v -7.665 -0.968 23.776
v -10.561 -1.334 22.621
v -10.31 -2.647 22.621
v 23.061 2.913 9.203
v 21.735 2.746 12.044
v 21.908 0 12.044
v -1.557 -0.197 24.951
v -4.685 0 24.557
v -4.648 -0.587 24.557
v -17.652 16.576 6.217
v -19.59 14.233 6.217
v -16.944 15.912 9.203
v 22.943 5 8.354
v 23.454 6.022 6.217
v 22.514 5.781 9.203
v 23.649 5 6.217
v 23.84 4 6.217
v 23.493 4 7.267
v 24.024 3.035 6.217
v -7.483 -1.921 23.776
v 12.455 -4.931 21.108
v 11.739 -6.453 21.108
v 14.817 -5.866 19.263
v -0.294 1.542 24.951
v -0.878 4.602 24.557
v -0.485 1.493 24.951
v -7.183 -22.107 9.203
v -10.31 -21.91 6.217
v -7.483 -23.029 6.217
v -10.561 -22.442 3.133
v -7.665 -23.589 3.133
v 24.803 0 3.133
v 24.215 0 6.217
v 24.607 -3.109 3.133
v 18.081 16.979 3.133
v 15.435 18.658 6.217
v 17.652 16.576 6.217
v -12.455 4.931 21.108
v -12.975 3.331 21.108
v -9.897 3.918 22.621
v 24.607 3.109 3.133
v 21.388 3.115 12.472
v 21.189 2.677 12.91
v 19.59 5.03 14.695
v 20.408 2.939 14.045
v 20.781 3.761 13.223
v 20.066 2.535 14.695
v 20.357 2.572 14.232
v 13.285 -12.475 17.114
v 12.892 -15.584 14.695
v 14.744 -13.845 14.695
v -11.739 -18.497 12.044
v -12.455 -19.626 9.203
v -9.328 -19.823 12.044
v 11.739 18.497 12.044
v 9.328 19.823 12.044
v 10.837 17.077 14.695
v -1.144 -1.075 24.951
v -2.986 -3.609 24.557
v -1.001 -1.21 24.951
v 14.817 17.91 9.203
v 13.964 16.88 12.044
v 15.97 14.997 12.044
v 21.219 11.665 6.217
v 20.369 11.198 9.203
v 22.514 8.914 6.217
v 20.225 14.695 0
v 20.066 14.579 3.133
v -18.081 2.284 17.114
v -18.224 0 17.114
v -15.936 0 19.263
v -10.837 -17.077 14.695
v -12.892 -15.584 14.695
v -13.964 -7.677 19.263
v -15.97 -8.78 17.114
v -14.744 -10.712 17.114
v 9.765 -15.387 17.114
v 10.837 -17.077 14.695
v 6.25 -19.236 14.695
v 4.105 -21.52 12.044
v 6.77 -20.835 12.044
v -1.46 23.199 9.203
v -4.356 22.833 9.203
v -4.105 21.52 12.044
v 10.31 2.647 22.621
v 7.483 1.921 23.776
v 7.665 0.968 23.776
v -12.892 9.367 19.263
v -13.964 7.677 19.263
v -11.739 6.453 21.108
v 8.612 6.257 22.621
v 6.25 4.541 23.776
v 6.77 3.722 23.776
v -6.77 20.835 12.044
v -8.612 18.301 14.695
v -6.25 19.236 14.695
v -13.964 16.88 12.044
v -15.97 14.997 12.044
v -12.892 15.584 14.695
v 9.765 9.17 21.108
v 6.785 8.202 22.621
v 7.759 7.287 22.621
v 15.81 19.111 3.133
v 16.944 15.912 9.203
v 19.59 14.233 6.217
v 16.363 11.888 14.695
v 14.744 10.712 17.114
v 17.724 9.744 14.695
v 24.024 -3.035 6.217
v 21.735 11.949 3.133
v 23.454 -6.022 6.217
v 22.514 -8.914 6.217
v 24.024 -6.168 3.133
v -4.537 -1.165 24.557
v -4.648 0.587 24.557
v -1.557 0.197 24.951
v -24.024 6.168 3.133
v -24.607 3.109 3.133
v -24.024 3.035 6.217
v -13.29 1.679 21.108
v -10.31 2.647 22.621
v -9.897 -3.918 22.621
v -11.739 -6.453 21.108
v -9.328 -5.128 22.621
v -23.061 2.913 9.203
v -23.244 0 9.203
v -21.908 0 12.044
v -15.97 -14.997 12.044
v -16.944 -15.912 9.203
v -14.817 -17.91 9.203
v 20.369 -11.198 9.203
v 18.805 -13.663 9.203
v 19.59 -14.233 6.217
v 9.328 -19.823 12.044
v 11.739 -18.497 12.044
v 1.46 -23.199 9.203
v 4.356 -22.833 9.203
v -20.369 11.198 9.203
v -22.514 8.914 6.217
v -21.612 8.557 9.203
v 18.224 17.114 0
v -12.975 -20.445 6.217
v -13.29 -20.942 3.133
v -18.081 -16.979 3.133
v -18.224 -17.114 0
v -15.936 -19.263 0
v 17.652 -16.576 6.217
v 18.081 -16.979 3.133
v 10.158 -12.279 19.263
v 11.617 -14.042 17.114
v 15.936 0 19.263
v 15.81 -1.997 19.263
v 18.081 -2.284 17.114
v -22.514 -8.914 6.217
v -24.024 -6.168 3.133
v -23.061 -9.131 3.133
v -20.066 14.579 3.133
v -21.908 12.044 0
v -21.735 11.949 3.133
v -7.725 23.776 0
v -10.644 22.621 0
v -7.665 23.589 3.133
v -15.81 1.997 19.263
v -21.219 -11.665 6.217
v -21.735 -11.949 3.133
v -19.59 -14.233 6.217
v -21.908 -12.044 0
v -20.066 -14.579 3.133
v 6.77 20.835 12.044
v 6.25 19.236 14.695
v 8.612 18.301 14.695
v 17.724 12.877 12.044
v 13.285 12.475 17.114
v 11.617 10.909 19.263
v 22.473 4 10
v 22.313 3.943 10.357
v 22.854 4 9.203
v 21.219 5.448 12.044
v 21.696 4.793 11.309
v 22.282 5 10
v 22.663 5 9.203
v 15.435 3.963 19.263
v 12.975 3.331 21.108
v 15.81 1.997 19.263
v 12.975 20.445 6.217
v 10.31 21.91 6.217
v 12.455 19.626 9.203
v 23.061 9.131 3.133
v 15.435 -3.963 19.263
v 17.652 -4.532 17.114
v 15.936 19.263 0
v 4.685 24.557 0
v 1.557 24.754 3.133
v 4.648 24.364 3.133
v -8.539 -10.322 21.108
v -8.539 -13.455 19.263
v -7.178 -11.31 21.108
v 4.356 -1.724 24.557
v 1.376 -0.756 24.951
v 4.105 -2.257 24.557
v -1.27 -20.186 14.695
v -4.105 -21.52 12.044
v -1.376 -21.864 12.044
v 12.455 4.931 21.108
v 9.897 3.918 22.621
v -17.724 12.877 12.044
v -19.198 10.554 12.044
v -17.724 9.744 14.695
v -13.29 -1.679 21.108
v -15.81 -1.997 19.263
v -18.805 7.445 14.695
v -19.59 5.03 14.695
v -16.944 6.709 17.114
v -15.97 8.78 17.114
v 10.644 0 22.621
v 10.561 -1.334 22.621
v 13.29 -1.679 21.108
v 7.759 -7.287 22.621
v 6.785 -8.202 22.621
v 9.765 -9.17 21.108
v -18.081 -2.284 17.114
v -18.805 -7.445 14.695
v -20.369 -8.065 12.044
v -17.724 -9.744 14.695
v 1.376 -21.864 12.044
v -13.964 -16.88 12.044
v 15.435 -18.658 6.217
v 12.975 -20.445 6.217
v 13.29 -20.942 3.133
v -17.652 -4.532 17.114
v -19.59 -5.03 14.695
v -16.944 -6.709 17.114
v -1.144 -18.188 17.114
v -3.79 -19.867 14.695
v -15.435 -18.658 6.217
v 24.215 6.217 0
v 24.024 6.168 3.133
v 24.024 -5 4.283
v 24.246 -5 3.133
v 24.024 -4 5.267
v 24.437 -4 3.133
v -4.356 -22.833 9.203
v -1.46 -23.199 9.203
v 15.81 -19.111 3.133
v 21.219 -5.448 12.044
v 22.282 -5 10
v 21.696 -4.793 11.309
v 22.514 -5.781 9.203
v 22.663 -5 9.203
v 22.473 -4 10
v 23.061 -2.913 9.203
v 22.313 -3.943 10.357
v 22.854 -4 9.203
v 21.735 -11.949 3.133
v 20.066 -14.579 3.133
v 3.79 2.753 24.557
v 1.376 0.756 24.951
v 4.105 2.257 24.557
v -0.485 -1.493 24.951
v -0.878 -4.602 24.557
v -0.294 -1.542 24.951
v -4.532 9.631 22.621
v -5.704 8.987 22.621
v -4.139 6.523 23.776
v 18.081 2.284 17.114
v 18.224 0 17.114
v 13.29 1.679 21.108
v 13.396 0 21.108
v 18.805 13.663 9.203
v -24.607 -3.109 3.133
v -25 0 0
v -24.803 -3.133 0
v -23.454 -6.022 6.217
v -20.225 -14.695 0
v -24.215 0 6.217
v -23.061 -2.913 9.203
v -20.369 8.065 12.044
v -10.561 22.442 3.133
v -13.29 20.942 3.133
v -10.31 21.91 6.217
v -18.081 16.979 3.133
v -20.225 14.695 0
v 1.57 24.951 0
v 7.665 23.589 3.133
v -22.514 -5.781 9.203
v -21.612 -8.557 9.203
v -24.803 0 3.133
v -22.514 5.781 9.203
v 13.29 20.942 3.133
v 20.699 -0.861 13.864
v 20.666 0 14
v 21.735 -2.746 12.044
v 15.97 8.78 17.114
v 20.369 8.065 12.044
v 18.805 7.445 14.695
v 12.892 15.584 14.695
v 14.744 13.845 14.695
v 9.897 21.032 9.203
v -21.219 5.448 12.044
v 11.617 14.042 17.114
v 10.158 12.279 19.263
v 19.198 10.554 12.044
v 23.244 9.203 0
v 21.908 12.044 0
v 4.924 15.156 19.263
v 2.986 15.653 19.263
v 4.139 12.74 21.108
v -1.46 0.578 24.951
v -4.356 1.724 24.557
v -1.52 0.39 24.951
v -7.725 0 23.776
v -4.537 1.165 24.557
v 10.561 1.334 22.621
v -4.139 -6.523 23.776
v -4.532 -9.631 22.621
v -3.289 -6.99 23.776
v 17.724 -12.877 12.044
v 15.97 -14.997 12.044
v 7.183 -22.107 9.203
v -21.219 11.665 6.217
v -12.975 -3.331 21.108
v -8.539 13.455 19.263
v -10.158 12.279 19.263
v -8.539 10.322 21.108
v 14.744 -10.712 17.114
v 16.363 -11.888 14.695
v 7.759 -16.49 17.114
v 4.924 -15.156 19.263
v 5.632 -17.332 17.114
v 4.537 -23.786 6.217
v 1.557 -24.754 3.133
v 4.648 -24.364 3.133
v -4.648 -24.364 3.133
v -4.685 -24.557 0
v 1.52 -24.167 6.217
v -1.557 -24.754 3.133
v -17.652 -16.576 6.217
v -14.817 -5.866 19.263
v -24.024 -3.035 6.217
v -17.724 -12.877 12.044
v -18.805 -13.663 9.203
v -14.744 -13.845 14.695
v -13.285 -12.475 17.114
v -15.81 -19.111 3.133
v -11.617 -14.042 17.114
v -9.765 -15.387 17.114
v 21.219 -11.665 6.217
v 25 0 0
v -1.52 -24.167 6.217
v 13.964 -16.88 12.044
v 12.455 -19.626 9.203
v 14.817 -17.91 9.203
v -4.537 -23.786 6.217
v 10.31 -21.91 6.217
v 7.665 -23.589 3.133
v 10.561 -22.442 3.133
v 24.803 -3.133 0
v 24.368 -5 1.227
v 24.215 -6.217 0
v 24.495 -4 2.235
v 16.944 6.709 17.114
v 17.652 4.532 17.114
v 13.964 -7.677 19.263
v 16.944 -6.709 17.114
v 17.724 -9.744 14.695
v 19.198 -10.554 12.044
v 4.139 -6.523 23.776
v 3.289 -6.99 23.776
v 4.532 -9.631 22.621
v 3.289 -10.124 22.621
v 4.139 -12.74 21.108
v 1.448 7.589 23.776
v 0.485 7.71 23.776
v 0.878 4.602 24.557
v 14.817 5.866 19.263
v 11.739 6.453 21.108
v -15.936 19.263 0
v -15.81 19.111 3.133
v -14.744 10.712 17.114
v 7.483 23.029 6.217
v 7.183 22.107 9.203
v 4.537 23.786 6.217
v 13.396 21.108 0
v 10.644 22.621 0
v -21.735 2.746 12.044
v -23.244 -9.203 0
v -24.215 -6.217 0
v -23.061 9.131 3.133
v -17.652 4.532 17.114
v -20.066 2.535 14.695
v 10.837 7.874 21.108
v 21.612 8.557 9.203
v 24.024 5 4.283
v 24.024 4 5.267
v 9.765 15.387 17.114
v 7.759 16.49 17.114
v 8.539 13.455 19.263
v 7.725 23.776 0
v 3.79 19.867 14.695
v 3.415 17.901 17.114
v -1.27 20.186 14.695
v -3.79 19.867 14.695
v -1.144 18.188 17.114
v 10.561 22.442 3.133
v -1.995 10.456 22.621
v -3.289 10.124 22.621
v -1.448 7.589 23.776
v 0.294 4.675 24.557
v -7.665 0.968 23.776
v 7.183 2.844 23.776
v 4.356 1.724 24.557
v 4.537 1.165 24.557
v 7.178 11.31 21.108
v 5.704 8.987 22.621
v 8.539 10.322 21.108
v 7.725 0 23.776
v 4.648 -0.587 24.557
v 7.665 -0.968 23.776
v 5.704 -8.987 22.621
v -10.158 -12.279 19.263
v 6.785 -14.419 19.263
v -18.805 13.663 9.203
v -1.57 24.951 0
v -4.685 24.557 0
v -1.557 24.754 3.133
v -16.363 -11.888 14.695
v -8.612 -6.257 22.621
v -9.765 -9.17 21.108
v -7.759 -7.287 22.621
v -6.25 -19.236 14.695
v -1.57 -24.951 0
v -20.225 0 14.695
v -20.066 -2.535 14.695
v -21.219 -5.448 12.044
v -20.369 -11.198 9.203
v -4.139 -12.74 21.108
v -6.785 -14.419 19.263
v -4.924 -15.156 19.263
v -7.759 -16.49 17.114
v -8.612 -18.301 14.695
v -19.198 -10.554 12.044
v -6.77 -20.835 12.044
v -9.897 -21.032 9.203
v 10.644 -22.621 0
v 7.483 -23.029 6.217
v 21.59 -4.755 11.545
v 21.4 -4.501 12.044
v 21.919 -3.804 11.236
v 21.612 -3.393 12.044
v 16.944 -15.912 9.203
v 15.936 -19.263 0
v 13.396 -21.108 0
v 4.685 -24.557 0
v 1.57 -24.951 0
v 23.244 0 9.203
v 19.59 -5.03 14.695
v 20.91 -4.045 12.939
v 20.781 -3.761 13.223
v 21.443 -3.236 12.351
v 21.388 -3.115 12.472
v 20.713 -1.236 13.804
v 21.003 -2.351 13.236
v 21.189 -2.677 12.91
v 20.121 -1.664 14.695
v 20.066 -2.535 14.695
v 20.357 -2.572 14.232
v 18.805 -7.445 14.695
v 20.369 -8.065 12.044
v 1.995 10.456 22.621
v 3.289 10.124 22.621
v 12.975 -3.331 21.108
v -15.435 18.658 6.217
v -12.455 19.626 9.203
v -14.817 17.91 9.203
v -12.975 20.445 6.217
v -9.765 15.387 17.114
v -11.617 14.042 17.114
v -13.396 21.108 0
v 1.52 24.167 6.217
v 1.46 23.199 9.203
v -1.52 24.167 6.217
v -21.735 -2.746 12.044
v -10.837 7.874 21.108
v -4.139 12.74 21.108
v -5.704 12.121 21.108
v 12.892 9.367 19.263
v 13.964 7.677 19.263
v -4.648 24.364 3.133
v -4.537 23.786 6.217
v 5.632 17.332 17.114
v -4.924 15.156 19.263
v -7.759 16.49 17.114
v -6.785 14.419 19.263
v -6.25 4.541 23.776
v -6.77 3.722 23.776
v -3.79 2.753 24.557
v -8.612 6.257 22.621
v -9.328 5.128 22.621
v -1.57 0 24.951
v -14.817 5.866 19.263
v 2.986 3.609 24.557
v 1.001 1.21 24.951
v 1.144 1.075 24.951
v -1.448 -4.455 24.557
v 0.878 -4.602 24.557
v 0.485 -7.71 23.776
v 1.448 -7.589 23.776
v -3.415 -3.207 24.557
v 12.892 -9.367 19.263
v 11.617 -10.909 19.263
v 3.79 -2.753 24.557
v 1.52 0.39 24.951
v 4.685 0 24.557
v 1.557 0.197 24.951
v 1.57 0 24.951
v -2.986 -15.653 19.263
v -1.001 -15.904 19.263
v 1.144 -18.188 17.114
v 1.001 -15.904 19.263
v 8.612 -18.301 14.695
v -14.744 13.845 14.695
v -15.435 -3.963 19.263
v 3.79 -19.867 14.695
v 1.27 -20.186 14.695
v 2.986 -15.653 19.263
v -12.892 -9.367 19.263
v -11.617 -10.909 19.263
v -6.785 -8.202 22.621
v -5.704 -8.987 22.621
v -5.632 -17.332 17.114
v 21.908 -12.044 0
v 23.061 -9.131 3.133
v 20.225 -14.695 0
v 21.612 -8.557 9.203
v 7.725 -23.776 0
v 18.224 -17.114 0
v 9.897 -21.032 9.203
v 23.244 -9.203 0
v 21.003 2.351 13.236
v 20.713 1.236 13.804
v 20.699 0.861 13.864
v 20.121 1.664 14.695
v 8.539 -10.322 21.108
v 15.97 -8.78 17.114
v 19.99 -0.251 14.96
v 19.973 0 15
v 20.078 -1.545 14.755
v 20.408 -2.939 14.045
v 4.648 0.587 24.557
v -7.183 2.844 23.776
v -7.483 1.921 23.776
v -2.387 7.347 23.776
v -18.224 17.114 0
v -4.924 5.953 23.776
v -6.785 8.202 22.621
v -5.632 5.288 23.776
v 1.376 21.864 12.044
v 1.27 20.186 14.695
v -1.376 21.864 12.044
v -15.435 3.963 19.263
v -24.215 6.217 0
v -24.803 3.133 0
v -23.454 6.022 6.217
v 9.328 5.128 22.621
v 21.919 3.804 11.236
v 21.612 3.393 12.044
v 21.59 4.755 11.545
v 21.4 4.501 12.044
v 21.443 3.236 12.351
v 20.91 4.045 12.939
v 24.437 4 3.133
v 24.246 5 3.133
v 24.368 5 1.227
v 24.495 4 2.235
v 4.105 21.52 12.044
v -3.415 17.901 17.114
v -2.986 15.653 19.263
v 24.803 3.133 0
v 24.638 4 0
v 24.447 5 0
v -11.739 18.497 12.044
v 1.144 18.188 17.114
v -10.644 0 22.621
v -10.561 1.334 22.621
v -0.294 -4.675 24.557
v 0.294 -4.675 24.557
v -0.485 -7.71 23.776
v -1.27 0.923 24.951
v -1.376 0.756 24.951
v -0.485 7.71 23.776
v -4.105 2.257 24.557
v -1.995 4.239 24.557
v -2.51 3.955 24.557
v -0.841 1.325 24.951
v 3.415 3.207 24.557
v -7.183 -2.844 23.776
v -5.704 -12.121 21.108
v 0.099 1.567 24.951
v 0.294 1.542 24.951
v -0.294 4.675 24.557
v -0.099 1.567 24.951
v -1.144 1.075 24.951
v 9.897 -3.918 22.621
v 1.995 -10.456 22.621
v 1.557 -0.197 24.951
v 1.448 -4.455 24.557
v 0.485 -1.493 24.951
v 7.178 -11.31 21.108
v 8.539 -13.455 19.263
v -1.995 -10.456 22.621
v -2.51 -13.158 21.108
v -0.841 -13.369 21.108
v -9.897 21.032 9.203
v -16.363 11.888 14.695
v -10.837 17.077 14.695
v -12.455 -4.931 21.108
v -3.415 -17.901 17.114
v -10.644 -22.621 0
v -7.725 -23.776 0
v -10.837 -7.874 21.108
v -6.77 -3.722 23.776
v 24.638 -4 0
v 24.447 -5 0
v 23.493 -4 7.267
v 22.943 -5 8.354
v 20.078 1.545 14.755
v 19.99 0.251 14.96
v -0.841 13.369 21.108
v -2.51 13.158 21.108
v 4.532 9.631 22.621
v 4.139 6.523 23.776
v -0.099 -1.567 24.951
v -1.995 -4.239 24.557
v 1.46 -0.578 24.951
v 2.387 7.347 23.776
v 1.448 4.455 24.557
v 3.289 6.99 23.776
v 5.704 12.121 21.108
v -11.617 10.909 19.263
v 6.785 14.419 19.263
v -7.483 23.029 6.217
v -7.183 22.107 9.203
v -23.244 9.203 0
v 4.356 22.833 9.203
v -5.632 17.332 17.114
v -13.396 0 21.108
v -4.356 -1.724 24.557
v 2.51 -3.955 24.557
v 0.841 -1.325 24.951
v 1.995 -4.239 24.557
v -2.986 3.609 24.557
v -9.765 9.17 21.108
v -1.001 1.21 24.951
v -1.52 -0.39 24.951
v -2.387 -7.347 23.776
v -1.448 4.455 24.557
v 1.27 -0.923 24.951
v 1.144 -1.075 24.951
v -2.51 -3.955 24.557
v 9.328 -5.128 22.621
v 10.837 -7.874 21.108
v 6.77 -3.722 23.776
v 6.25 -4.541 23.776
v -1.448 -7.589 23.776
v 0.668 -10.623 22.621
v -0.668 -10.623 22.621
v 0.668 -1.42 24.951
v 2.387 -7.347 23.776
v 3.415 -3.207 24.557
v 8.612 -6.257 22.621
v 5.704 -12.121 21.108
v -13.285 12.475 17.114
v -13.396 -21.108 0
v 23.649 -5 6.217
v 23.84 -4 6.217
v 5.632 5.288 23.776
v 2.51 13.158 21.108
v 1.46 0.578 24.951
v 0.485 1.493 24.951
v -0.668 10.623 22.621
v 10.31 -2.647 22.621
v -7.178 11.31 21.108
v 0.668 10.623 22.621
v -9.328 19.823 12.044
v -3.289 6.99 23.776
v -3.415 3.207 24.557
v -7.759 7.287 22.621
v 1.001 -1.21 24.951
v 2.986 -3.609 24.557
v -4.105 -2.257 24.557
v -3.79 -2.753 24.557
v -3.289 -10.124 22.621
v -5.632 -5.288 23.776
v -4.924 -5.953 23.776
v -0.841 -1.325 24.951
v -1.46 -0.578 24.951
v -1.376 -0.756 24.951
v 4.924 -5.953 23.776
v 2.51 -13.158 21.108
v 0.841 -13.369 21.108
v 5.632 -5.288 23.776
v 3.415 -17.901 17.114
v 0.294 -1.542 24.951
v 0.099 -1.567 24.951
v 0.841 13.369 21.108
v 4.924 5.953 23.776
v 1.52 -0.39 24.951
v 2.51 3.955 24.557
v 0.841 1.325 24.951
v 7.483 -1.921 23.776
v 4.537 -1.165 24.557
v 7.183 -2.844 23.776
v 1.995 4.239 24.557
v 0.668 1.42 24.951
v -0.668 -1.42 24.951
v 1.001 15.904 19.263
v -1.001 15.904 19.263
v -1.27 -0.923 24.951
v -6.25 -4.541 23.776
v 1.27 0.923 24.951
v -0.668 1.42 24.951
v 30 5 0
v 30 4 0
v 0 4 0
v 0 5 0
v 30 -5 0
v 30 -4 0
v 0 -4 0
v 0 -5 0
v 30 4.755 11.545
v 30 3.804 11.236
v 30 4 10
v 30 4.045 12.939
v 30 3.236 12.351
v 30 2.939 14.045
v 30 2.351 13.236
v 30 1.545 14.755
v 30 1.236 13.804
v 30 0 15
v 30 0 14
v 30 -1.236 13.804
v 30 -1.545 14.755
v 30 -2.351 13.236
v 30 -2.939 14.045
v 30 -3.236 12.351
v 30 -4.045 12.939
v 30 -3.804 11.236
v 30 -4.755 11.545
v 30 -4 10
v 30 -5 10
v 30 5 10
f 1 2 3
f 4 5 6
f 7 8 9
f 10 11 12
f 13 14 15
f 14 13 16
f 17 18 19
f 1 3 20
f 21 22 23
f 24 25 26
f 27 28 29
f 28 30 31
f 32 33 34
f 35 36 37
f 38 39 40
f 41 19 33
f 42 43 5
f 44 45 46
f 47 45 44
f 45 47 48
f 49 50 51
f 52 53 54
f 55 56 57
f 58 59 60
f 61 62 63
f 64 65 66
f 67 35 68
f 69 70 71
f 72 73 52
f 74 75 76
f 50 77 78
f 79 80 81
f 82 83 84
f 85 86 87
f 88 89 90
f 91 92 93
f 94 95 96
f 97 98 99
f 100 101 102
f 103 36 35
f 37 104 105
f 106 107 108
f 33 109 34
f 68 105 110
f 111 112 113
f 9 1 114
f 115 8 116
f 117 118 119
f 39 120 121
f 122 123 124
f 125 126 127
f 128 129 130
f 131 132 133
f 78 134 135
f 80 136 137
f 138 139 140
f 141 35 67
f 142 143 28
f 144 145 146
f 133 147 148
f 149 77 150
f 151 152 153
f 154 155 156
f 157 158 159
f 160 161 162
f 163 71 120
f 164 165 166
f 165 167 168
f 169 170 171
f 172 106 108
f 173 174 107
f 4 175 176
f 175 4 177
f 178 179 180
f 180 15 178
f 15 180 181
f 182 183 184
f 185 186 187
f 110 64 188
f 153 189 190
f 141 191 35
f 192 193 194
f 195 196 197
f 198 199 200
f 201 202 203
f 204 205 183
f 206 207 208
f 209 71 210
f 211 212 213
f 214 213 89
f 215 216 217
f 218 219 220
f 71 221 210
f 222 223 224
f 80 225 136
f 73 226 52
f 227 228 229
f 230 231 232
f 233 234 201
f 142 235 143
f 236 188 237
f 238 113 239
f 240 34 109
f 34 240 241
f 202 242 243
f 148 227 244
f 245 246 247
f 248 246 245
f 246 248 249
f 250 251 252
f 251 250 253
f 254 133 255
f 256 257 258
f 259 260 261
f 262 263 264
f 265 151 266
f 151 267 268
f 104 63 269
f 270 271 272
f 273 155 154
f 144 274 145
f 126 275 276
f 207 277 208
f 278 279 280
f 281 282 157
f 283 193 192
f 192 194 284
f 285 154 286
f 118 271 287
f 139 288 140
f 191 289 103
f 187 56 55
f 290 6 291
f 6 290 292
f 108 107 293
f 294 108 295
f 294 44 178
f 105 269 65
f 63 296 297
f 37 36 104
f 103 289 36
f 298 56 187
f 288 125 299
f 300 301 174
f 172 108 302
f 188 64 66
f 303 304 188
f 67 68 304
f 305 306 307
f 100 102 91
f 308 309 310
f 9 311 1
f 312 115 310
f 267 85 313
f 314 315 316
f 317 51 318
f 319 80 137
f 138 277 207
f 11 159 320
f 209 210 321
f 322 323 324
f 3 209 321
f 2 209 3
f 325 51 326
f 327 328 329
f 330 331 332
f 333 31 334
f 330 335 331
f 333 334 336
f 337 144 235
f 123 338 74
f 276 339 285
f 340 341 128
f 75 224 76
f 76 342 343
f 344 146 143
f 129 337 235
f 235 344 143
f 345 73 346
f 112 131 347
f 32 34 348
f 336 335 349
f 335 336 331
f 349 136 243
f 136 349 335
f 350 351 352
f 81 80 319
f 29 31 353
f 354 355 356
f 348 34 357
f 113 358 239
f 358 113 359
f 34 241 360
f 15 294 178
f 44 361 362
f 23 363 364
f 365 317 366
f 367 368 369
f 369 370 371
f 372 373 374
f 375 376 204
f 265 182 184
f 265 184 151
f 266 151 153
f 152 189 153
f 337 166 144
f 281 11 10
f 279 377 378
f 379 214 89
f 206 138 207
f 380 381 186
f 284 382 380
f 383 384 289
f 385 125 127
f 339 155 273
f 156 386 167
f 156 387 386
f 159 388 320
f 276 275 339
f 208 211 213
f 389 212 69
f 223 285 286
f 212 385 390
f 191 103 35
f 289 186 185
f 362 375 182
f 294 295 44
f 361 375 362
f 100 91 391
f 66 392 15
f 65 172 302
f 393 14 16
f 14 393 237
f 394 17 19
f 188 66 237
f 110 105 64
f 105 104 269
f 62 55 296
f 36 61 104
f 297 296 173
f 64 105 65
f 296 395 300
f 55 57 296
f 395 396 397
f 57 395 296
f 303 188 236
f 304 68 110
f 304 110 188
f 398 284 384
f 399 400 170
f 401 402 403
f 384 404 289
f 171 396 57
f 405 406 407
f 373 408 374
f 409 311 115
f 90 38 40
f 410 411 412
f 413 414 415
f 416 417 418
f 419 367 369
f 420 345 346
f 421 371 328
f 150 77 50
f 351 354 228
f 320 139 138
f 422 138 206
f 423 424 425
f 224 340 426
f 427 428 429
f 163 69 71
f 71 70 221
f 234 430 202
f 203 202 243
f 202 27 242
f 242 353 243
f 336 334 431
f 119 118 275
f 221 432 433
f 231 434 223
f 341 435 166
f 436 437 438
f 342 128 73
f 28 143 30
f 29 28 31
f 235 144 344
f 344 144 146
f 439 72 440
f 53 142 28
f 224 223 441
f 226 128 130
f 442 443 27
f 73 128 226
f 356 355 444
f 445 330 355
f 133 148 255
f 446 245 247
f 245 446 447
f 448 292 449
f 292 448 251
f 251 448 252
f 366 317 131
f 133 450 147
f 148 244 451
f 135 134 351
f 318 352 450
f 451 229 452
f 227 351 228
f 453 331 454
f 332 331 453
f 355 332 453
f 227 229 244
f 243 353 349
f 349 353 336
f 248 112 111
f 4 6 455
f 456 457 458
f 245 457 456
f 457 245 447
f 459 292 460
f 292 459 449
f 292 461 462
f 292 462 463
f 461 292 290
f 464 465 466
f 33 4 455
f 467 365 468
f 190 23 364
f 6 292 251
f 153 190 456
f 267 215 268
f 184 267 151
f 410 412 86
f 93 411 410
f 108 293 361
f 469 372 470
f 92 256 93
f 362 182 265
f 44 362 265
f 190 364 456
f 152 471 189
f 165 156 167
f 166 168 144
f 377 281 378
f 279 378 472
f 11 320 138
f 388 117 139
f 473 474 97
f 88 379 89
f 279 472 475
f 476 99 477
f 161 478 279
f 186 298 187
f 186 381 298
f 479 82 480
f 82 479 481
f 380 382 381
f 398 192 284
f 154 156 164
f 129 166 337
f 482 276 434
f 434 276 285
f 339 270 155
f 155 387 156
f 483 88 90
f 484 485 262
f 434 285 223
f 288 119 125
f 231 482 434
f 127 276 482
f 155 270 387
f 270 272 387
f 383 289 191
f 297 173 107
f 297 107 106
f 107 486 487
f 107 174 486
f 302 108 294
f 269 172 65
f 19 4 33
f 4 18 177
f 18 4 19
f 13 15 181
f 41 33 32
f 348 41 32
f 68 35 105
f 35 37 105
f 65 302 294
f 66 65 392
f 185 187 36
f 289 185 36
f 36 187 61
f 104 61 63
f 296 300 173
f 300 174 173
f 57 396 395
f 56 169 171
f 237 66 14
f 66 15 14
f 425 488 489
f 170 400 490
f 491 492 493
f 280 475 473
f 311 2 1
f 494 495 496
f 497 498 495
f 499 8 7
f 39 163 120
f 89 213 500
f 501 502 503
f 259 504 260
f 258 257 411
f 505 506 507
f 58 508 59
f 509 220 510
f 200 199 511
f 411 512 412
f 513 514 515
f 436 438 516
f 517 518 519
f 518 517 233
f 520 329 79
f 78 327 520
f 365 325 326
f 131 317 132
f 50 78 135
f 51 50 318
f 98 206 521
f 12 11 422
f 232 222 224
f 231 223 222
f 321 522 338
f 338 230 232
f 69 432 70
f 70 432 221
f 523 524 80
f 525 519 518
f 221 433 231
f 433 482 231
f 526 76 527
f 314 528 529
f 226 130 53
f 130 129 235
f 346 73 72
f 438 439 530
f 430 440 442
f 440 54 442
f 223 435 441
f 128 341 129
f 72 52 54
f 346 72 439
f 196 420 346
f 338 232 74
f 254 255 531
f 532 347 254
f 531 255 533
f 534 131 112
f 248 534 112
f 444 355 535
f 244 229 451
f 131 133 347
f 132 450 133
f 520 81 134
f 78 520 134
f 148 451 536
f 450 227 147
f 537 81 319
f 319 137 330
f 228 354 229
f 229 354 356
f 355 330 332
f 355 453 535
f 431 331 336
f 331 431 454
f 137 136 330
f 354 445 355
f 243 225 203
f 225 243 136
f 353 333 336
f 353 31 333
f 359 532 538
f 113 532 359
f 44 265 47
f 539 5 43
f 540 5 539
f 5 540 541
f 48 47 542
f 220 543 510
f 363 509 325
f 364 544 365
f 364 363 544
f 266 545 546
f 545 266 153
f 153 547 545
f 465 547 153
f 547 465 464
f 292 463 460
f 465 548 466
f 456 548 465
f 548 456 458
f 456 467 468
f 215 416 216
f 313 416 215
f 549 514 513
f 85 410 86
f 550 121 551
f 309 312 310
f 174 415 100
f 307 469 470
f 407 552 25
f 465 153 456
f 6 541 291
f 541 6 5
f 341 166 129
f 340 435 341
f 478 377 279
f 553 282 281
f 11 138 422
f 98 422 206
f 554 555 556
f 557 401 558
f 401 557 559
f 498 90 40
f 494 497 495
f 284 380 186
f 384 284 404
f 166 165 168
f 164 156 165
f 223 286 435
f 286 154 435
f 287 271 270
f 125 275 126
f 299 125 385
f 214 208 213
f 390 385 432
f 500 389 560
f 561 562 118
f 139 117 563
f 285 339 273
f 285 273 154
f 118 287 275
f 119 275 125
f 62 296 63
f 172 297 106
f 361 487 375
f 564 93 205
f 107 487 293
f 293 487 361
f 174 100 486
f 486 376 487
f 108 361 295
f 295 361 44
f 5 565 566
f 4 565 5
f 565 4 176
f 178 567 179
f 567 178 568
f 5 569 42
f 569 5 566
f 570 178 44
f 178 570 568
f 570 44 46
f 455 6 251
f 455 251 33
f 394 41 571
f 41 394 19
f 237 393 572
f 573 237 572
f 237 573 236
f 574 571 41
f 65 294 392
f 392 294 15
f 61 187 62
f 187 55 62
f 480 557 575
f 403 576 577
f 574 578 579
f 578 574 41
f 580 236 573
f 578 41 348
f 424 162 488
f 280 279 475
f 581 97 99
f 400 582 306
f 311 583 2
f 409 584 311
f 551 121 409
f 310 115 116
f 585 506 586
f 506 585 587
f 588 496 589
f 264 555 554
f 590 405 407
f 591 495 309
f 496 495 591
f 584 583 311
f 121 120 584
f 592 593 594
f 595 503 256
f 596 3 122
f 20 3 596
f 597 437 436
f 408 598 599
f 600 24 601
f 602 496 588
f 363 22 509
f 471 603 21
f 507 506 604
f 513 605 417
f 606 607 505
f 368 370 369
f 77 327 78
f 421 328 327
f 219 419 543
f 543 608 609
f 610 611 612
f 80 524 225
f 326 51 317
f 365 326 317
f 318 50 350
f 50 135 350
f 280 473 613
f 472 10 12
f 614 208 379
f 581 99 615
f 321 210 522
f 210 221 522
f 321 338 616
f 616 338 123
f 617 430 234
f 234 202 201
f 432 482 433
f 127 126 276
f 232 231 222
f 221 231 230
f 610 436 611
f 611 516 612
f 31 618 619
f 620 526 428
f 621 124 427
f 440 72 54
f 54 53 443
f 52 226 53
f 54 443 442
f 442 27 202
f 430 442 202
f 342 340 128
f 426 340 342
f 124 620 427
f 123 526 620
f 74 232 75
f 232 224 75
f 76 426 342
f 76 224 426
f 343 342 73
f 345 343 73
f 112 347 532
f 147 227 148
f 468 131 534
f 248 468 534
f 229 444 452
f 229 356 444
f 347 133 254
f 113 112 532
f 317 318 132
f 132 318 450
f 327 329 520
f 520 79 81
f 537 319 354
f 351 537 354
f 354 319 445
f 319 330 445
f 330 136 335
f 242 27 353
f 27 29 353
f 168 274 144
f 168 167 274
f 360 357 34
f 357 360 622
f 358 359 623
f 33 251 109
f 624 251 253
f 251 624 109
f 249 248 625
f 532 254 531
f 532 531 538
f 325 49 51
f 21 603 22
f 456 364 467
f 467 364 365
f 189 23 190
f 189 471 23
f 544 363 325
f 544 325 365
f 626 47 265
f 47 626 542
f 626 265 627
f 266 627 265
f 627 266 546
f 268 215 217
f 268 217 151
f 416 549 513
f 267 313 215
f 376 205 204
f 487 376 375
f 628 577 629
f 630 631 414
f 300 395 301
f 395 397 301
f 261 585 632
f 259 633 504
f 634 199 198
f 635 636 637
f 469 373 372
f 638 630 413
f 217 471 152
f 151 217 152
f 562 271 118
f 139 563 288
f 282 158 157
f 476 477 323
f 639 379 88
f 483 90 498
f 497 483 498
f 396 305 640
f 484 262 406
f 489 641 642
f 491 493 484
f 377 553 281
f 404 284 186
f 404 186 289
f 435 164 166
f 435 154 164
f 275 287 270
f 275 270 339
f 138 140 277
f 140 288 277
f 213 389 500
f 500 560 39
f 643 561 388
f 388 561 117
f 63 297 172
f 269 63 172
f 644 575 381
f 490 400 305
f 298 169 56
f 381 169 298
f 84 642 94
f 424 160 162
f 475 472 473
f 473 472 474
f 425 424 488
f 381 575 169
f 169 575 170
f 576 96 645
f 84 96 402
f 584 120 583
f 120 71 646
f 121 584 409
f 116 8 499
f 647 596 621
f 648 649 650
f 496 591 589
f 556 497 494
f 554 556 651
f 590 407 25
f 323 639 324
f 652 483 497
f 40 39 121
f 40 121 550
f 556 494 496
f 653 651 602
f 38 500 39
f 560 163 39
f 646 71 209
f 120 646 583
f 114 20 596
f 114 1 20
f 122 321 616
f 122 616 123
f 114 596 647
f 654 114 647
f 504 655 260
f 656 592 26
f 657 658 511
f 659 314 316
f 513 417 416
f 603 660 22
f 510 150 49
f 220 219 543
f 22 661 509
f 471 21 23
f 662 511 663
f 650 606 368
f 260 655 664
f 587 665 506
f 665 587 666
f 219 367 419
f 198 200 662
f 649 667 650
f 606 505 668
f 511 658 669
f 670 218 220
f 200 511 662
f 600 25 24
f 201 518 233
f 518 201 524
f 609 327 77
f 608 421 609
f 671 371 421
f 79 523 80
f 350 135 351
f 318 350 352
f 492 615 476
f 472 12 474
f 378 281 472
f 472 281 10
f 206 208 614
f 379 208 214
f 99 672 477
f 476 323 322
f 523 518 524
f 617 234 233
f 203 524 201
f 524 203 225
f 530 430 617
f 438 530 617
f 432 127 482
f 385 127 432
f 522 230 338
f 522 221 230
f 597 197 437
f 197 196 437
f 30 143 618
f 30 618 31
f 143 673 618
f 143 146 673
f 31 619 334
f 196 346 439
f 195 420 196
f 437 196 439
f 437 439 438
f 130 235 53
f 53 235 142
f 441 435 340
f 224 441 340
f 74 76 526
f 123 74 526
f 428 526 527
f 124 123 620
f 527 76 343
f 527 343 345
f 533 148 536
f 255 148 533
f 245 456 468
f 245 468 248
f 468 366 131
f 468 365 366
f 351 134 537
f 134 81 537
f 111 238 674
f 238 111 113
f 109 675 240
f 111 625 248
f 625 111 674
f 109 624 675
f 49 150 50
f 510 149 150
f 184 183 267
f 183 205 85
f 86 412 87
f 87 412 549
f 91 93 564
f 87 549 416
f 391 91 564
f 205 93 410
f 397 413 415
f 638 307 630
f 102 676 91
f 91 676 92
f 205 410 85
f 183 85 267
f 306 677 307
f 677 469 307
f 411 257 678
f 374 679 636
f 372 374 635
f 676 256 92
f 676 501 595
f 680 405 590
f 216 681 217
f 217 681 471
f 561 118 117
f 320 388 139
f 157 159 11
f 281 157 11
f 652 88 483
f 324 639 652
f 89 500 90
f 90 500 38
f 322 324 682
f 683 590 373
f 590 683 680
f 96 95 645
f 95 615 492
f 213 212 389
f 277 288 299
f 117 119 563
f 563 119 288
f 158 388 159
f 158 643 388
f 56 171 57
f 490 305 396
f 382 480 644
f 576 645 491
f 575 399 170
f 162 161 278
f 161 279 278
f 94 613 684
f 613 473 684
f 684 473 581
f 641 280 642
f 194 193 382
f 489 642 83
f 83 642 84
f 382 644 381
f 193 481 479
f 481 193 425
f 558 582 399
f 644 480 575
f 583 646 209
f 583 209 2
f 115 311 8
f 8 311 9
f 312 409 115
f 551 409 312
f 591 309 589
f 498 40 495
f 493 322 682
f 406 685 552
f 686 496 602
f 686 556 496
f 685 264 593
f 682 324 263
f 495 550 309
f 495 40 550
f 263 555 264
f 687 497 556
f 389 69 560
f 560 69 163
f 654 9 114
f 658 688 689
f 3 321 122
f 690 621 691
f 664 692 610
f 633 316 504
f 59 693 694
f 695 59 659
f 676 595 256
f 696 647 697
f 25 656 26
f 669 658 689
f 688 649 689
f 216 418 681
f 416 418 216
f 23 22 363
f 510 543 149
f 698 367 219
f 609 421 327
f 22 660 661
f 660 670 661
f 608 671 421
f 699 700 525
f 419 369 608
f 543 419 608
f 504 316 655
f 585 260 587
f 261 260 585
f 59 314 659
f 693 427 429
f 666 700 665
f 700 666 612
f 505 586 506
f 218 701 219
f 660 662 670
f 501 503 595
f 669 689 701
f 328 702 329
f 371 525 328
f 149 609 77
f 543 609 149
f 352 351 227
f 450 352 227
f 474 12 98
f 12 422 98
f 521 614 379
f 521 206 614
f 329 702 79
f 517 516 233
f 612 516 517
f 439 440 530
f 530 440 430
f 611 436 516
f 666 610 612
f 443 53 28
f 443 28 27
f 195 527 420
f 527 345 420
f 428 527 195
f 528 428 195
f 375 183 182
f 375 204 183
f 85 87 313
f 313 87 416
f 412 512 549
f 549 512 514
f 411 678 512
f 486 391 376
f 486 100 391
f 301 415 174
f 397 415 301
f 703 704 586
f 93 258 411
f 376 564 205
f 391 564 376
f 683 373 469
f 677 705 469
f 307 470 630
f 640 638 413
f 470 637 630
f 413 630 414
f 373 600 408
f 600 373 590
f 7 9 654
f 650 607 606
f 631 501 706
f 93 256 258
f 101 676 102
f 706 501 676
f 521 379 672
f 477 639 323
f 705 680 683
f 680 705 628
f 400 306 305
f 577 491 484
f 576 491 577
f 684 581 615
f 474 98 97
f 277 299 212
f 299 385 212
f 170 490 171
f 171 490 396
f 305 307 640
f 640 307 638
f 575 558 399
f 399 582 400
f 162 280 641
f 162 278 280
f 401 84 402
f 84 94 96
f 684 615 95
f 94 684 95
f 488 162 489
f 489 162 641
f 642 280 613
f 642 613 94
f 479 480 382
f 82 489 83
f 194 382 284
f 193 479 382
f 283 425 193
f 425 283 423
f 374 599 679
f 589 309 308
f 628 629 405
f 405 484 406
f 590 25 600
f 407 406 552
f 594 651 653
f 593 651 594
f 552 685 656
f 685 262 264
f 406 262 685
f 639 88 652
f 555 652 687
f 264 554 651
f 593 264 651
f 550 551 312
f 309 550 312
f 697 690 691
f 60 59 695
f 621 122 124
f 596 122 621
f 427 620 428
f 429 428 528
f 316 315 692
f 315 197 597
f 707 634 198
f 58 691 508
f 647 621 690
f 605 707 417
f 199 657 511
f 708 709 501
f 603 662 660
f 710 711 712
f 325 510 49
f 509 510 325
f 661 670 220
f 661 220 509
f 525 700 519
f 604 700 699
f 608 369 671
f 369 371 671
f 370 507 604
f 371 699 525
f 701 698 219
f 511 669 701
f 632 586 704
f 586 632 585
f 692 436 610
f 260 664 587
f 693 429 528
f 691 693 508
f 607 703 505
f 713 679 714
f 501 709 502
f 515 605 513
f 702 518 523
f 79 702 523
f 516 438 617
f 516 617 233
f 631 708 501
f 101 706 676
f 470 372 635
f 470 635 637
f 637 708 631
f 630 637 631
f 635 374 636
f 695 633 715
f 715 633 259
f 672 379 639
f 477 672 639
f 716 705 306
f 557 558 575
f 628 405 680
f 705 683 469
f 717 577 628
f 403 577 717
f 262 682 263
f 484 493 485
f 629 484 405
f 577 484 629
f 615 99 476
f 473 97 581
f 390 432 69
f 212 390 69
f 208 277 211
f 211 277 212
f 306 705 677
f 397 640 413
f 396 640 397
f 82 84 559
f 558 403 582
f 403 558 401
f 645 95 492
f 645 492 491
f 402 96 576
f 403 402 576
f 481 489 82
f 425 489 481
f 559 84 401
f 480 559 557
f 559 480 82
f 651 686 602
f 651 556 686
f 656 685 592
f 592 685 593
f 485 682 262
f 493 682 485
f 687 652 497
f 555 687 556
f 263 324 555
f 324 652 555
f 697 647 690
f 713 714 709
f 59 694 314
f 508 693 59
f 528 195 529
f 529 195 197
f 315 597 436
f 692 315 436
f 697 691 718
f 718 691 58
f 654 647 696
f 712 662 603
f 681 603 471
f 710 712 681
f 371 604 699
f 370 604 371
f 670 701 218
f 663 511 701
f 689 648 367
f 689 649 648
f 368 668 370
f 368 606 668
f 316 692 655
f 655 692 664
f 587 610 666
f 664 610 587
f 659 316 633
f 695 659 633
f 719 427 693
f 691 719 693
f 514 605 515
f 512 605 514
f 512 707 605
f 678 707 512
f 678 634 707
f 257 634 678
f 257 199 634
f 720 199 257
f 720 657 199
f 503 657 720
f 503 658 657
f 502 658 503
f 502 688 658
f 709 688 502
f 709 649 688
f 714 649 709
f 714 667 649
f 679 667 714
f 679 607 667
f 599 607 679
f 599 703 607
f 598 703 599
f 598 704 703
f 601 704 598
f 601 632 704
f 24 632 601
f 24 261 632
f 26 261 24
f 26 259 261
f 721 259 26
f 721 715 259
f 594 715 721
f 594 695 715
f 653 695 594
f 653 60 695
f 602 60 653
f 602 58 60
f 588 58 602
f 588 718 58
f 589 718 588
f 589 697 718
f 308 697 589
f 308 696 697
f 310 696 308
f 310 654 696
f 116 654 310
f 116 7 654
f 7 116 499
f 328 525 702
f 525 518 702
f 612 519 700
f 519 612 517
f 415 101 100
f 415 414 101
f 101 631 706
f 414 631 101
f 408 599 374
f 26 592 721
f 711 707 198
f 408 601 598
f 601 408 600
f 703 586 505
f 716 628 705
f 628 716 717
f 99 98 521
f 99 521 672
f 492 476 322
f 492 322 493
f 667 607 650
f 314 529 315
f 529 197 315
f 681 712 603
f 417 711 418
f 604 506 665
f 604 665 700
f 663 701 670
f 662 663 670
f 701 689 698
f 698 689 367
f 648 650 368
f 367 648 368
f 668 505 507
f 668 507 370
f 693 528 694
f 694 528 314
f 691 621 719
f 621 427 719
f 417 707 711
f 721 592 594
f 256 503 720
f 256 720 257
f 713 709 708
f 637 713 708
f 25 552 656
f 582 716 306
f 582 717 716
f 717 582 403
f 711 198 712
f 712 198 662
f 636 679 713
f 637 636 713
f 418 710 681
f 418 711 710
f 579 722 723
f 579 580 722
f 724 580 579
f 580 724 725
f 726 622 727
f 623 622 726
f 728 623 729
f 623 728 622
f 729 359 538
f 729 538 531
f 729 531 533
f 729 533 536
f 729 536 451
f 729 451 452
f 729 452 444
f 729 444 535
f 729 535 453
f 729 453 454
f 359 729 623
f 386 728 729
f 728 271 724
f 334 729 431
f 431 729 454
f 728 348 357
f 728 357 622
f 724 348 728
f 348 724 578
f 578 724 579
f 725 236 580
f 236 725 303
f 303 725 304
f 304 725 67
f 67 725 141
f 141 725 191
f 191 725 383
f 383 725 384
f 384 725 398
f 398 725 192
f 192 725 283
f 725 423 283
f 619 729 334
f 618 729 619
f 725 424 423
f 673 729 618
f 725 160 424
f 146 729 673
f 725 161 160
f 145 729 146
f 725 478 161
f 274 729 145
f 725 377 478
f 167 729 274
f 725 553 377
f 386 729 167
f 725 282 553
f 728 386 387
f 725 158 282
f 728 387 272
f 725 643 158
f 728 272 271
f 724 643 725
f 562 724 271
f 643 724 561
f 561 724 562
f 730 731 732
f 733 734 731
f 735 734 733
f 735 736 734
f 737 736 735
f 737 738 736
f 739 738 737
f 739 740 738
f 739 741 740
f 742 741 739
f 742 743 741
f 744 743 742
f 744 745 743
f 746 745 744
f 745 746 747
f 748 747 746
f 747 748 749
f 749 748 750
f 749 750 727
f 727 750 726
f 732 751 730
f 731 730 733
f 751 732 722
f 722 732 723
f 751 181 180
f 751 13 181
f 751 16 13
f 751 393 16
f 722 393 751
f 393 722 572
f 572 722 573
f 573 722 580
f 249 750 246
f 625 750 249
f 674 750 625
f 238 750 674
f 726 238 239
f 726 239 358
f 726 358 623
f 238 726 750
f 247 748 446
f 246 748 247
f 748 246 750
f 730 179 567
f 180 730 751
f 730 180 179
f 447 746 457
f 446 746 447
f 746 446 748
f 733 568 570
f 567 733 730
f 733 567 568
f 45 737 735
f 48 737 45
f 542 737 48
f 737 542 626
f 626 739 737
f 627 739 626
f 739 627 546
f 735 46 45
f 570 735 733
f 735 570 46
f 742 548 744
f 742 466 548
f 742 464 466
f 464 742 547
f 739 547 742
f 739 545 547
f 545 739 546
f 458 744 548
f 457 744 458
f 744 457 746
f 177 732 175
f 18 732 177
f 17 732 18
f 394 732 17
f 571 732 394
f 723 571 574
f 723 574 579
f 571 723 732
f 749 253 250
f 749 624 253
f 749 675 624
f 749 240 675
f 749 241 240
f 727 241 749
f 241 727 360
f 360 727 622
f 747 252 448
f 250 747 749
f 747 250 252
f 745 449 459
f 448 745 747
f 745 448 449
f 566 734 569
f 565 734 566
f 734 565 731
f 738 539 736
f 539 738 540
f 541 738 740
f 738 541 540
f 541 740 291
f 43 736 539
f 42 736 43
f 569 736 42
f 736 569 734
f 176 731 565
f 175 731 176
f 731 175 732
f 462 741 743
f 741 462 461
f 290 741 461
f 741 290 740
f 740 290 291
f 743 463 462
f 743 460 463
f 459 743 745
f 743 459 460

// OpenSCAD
// simple iglu

difference(){
    sphere(25,$fn=50);
    translate([-25,-25,-25]){
        cube([50,50,25]);
    }
}

difference(){
    union(){
        translate([0,-5,0]){
            cube([30,10,10]);
        }
        translate([0,0,10]){
            rotate([0,90,0]){
                cylinder(30,5,5,$fn=20);
            }
        }
    }
    union(){
        translate([0,-4,-10]){
            cube([40,8,20]);
        }
        translate([0,0,10]){
            rotate([0,90,0]){
                cylinder(40,4,4,$fn=20);
            }
        }
    }
}
